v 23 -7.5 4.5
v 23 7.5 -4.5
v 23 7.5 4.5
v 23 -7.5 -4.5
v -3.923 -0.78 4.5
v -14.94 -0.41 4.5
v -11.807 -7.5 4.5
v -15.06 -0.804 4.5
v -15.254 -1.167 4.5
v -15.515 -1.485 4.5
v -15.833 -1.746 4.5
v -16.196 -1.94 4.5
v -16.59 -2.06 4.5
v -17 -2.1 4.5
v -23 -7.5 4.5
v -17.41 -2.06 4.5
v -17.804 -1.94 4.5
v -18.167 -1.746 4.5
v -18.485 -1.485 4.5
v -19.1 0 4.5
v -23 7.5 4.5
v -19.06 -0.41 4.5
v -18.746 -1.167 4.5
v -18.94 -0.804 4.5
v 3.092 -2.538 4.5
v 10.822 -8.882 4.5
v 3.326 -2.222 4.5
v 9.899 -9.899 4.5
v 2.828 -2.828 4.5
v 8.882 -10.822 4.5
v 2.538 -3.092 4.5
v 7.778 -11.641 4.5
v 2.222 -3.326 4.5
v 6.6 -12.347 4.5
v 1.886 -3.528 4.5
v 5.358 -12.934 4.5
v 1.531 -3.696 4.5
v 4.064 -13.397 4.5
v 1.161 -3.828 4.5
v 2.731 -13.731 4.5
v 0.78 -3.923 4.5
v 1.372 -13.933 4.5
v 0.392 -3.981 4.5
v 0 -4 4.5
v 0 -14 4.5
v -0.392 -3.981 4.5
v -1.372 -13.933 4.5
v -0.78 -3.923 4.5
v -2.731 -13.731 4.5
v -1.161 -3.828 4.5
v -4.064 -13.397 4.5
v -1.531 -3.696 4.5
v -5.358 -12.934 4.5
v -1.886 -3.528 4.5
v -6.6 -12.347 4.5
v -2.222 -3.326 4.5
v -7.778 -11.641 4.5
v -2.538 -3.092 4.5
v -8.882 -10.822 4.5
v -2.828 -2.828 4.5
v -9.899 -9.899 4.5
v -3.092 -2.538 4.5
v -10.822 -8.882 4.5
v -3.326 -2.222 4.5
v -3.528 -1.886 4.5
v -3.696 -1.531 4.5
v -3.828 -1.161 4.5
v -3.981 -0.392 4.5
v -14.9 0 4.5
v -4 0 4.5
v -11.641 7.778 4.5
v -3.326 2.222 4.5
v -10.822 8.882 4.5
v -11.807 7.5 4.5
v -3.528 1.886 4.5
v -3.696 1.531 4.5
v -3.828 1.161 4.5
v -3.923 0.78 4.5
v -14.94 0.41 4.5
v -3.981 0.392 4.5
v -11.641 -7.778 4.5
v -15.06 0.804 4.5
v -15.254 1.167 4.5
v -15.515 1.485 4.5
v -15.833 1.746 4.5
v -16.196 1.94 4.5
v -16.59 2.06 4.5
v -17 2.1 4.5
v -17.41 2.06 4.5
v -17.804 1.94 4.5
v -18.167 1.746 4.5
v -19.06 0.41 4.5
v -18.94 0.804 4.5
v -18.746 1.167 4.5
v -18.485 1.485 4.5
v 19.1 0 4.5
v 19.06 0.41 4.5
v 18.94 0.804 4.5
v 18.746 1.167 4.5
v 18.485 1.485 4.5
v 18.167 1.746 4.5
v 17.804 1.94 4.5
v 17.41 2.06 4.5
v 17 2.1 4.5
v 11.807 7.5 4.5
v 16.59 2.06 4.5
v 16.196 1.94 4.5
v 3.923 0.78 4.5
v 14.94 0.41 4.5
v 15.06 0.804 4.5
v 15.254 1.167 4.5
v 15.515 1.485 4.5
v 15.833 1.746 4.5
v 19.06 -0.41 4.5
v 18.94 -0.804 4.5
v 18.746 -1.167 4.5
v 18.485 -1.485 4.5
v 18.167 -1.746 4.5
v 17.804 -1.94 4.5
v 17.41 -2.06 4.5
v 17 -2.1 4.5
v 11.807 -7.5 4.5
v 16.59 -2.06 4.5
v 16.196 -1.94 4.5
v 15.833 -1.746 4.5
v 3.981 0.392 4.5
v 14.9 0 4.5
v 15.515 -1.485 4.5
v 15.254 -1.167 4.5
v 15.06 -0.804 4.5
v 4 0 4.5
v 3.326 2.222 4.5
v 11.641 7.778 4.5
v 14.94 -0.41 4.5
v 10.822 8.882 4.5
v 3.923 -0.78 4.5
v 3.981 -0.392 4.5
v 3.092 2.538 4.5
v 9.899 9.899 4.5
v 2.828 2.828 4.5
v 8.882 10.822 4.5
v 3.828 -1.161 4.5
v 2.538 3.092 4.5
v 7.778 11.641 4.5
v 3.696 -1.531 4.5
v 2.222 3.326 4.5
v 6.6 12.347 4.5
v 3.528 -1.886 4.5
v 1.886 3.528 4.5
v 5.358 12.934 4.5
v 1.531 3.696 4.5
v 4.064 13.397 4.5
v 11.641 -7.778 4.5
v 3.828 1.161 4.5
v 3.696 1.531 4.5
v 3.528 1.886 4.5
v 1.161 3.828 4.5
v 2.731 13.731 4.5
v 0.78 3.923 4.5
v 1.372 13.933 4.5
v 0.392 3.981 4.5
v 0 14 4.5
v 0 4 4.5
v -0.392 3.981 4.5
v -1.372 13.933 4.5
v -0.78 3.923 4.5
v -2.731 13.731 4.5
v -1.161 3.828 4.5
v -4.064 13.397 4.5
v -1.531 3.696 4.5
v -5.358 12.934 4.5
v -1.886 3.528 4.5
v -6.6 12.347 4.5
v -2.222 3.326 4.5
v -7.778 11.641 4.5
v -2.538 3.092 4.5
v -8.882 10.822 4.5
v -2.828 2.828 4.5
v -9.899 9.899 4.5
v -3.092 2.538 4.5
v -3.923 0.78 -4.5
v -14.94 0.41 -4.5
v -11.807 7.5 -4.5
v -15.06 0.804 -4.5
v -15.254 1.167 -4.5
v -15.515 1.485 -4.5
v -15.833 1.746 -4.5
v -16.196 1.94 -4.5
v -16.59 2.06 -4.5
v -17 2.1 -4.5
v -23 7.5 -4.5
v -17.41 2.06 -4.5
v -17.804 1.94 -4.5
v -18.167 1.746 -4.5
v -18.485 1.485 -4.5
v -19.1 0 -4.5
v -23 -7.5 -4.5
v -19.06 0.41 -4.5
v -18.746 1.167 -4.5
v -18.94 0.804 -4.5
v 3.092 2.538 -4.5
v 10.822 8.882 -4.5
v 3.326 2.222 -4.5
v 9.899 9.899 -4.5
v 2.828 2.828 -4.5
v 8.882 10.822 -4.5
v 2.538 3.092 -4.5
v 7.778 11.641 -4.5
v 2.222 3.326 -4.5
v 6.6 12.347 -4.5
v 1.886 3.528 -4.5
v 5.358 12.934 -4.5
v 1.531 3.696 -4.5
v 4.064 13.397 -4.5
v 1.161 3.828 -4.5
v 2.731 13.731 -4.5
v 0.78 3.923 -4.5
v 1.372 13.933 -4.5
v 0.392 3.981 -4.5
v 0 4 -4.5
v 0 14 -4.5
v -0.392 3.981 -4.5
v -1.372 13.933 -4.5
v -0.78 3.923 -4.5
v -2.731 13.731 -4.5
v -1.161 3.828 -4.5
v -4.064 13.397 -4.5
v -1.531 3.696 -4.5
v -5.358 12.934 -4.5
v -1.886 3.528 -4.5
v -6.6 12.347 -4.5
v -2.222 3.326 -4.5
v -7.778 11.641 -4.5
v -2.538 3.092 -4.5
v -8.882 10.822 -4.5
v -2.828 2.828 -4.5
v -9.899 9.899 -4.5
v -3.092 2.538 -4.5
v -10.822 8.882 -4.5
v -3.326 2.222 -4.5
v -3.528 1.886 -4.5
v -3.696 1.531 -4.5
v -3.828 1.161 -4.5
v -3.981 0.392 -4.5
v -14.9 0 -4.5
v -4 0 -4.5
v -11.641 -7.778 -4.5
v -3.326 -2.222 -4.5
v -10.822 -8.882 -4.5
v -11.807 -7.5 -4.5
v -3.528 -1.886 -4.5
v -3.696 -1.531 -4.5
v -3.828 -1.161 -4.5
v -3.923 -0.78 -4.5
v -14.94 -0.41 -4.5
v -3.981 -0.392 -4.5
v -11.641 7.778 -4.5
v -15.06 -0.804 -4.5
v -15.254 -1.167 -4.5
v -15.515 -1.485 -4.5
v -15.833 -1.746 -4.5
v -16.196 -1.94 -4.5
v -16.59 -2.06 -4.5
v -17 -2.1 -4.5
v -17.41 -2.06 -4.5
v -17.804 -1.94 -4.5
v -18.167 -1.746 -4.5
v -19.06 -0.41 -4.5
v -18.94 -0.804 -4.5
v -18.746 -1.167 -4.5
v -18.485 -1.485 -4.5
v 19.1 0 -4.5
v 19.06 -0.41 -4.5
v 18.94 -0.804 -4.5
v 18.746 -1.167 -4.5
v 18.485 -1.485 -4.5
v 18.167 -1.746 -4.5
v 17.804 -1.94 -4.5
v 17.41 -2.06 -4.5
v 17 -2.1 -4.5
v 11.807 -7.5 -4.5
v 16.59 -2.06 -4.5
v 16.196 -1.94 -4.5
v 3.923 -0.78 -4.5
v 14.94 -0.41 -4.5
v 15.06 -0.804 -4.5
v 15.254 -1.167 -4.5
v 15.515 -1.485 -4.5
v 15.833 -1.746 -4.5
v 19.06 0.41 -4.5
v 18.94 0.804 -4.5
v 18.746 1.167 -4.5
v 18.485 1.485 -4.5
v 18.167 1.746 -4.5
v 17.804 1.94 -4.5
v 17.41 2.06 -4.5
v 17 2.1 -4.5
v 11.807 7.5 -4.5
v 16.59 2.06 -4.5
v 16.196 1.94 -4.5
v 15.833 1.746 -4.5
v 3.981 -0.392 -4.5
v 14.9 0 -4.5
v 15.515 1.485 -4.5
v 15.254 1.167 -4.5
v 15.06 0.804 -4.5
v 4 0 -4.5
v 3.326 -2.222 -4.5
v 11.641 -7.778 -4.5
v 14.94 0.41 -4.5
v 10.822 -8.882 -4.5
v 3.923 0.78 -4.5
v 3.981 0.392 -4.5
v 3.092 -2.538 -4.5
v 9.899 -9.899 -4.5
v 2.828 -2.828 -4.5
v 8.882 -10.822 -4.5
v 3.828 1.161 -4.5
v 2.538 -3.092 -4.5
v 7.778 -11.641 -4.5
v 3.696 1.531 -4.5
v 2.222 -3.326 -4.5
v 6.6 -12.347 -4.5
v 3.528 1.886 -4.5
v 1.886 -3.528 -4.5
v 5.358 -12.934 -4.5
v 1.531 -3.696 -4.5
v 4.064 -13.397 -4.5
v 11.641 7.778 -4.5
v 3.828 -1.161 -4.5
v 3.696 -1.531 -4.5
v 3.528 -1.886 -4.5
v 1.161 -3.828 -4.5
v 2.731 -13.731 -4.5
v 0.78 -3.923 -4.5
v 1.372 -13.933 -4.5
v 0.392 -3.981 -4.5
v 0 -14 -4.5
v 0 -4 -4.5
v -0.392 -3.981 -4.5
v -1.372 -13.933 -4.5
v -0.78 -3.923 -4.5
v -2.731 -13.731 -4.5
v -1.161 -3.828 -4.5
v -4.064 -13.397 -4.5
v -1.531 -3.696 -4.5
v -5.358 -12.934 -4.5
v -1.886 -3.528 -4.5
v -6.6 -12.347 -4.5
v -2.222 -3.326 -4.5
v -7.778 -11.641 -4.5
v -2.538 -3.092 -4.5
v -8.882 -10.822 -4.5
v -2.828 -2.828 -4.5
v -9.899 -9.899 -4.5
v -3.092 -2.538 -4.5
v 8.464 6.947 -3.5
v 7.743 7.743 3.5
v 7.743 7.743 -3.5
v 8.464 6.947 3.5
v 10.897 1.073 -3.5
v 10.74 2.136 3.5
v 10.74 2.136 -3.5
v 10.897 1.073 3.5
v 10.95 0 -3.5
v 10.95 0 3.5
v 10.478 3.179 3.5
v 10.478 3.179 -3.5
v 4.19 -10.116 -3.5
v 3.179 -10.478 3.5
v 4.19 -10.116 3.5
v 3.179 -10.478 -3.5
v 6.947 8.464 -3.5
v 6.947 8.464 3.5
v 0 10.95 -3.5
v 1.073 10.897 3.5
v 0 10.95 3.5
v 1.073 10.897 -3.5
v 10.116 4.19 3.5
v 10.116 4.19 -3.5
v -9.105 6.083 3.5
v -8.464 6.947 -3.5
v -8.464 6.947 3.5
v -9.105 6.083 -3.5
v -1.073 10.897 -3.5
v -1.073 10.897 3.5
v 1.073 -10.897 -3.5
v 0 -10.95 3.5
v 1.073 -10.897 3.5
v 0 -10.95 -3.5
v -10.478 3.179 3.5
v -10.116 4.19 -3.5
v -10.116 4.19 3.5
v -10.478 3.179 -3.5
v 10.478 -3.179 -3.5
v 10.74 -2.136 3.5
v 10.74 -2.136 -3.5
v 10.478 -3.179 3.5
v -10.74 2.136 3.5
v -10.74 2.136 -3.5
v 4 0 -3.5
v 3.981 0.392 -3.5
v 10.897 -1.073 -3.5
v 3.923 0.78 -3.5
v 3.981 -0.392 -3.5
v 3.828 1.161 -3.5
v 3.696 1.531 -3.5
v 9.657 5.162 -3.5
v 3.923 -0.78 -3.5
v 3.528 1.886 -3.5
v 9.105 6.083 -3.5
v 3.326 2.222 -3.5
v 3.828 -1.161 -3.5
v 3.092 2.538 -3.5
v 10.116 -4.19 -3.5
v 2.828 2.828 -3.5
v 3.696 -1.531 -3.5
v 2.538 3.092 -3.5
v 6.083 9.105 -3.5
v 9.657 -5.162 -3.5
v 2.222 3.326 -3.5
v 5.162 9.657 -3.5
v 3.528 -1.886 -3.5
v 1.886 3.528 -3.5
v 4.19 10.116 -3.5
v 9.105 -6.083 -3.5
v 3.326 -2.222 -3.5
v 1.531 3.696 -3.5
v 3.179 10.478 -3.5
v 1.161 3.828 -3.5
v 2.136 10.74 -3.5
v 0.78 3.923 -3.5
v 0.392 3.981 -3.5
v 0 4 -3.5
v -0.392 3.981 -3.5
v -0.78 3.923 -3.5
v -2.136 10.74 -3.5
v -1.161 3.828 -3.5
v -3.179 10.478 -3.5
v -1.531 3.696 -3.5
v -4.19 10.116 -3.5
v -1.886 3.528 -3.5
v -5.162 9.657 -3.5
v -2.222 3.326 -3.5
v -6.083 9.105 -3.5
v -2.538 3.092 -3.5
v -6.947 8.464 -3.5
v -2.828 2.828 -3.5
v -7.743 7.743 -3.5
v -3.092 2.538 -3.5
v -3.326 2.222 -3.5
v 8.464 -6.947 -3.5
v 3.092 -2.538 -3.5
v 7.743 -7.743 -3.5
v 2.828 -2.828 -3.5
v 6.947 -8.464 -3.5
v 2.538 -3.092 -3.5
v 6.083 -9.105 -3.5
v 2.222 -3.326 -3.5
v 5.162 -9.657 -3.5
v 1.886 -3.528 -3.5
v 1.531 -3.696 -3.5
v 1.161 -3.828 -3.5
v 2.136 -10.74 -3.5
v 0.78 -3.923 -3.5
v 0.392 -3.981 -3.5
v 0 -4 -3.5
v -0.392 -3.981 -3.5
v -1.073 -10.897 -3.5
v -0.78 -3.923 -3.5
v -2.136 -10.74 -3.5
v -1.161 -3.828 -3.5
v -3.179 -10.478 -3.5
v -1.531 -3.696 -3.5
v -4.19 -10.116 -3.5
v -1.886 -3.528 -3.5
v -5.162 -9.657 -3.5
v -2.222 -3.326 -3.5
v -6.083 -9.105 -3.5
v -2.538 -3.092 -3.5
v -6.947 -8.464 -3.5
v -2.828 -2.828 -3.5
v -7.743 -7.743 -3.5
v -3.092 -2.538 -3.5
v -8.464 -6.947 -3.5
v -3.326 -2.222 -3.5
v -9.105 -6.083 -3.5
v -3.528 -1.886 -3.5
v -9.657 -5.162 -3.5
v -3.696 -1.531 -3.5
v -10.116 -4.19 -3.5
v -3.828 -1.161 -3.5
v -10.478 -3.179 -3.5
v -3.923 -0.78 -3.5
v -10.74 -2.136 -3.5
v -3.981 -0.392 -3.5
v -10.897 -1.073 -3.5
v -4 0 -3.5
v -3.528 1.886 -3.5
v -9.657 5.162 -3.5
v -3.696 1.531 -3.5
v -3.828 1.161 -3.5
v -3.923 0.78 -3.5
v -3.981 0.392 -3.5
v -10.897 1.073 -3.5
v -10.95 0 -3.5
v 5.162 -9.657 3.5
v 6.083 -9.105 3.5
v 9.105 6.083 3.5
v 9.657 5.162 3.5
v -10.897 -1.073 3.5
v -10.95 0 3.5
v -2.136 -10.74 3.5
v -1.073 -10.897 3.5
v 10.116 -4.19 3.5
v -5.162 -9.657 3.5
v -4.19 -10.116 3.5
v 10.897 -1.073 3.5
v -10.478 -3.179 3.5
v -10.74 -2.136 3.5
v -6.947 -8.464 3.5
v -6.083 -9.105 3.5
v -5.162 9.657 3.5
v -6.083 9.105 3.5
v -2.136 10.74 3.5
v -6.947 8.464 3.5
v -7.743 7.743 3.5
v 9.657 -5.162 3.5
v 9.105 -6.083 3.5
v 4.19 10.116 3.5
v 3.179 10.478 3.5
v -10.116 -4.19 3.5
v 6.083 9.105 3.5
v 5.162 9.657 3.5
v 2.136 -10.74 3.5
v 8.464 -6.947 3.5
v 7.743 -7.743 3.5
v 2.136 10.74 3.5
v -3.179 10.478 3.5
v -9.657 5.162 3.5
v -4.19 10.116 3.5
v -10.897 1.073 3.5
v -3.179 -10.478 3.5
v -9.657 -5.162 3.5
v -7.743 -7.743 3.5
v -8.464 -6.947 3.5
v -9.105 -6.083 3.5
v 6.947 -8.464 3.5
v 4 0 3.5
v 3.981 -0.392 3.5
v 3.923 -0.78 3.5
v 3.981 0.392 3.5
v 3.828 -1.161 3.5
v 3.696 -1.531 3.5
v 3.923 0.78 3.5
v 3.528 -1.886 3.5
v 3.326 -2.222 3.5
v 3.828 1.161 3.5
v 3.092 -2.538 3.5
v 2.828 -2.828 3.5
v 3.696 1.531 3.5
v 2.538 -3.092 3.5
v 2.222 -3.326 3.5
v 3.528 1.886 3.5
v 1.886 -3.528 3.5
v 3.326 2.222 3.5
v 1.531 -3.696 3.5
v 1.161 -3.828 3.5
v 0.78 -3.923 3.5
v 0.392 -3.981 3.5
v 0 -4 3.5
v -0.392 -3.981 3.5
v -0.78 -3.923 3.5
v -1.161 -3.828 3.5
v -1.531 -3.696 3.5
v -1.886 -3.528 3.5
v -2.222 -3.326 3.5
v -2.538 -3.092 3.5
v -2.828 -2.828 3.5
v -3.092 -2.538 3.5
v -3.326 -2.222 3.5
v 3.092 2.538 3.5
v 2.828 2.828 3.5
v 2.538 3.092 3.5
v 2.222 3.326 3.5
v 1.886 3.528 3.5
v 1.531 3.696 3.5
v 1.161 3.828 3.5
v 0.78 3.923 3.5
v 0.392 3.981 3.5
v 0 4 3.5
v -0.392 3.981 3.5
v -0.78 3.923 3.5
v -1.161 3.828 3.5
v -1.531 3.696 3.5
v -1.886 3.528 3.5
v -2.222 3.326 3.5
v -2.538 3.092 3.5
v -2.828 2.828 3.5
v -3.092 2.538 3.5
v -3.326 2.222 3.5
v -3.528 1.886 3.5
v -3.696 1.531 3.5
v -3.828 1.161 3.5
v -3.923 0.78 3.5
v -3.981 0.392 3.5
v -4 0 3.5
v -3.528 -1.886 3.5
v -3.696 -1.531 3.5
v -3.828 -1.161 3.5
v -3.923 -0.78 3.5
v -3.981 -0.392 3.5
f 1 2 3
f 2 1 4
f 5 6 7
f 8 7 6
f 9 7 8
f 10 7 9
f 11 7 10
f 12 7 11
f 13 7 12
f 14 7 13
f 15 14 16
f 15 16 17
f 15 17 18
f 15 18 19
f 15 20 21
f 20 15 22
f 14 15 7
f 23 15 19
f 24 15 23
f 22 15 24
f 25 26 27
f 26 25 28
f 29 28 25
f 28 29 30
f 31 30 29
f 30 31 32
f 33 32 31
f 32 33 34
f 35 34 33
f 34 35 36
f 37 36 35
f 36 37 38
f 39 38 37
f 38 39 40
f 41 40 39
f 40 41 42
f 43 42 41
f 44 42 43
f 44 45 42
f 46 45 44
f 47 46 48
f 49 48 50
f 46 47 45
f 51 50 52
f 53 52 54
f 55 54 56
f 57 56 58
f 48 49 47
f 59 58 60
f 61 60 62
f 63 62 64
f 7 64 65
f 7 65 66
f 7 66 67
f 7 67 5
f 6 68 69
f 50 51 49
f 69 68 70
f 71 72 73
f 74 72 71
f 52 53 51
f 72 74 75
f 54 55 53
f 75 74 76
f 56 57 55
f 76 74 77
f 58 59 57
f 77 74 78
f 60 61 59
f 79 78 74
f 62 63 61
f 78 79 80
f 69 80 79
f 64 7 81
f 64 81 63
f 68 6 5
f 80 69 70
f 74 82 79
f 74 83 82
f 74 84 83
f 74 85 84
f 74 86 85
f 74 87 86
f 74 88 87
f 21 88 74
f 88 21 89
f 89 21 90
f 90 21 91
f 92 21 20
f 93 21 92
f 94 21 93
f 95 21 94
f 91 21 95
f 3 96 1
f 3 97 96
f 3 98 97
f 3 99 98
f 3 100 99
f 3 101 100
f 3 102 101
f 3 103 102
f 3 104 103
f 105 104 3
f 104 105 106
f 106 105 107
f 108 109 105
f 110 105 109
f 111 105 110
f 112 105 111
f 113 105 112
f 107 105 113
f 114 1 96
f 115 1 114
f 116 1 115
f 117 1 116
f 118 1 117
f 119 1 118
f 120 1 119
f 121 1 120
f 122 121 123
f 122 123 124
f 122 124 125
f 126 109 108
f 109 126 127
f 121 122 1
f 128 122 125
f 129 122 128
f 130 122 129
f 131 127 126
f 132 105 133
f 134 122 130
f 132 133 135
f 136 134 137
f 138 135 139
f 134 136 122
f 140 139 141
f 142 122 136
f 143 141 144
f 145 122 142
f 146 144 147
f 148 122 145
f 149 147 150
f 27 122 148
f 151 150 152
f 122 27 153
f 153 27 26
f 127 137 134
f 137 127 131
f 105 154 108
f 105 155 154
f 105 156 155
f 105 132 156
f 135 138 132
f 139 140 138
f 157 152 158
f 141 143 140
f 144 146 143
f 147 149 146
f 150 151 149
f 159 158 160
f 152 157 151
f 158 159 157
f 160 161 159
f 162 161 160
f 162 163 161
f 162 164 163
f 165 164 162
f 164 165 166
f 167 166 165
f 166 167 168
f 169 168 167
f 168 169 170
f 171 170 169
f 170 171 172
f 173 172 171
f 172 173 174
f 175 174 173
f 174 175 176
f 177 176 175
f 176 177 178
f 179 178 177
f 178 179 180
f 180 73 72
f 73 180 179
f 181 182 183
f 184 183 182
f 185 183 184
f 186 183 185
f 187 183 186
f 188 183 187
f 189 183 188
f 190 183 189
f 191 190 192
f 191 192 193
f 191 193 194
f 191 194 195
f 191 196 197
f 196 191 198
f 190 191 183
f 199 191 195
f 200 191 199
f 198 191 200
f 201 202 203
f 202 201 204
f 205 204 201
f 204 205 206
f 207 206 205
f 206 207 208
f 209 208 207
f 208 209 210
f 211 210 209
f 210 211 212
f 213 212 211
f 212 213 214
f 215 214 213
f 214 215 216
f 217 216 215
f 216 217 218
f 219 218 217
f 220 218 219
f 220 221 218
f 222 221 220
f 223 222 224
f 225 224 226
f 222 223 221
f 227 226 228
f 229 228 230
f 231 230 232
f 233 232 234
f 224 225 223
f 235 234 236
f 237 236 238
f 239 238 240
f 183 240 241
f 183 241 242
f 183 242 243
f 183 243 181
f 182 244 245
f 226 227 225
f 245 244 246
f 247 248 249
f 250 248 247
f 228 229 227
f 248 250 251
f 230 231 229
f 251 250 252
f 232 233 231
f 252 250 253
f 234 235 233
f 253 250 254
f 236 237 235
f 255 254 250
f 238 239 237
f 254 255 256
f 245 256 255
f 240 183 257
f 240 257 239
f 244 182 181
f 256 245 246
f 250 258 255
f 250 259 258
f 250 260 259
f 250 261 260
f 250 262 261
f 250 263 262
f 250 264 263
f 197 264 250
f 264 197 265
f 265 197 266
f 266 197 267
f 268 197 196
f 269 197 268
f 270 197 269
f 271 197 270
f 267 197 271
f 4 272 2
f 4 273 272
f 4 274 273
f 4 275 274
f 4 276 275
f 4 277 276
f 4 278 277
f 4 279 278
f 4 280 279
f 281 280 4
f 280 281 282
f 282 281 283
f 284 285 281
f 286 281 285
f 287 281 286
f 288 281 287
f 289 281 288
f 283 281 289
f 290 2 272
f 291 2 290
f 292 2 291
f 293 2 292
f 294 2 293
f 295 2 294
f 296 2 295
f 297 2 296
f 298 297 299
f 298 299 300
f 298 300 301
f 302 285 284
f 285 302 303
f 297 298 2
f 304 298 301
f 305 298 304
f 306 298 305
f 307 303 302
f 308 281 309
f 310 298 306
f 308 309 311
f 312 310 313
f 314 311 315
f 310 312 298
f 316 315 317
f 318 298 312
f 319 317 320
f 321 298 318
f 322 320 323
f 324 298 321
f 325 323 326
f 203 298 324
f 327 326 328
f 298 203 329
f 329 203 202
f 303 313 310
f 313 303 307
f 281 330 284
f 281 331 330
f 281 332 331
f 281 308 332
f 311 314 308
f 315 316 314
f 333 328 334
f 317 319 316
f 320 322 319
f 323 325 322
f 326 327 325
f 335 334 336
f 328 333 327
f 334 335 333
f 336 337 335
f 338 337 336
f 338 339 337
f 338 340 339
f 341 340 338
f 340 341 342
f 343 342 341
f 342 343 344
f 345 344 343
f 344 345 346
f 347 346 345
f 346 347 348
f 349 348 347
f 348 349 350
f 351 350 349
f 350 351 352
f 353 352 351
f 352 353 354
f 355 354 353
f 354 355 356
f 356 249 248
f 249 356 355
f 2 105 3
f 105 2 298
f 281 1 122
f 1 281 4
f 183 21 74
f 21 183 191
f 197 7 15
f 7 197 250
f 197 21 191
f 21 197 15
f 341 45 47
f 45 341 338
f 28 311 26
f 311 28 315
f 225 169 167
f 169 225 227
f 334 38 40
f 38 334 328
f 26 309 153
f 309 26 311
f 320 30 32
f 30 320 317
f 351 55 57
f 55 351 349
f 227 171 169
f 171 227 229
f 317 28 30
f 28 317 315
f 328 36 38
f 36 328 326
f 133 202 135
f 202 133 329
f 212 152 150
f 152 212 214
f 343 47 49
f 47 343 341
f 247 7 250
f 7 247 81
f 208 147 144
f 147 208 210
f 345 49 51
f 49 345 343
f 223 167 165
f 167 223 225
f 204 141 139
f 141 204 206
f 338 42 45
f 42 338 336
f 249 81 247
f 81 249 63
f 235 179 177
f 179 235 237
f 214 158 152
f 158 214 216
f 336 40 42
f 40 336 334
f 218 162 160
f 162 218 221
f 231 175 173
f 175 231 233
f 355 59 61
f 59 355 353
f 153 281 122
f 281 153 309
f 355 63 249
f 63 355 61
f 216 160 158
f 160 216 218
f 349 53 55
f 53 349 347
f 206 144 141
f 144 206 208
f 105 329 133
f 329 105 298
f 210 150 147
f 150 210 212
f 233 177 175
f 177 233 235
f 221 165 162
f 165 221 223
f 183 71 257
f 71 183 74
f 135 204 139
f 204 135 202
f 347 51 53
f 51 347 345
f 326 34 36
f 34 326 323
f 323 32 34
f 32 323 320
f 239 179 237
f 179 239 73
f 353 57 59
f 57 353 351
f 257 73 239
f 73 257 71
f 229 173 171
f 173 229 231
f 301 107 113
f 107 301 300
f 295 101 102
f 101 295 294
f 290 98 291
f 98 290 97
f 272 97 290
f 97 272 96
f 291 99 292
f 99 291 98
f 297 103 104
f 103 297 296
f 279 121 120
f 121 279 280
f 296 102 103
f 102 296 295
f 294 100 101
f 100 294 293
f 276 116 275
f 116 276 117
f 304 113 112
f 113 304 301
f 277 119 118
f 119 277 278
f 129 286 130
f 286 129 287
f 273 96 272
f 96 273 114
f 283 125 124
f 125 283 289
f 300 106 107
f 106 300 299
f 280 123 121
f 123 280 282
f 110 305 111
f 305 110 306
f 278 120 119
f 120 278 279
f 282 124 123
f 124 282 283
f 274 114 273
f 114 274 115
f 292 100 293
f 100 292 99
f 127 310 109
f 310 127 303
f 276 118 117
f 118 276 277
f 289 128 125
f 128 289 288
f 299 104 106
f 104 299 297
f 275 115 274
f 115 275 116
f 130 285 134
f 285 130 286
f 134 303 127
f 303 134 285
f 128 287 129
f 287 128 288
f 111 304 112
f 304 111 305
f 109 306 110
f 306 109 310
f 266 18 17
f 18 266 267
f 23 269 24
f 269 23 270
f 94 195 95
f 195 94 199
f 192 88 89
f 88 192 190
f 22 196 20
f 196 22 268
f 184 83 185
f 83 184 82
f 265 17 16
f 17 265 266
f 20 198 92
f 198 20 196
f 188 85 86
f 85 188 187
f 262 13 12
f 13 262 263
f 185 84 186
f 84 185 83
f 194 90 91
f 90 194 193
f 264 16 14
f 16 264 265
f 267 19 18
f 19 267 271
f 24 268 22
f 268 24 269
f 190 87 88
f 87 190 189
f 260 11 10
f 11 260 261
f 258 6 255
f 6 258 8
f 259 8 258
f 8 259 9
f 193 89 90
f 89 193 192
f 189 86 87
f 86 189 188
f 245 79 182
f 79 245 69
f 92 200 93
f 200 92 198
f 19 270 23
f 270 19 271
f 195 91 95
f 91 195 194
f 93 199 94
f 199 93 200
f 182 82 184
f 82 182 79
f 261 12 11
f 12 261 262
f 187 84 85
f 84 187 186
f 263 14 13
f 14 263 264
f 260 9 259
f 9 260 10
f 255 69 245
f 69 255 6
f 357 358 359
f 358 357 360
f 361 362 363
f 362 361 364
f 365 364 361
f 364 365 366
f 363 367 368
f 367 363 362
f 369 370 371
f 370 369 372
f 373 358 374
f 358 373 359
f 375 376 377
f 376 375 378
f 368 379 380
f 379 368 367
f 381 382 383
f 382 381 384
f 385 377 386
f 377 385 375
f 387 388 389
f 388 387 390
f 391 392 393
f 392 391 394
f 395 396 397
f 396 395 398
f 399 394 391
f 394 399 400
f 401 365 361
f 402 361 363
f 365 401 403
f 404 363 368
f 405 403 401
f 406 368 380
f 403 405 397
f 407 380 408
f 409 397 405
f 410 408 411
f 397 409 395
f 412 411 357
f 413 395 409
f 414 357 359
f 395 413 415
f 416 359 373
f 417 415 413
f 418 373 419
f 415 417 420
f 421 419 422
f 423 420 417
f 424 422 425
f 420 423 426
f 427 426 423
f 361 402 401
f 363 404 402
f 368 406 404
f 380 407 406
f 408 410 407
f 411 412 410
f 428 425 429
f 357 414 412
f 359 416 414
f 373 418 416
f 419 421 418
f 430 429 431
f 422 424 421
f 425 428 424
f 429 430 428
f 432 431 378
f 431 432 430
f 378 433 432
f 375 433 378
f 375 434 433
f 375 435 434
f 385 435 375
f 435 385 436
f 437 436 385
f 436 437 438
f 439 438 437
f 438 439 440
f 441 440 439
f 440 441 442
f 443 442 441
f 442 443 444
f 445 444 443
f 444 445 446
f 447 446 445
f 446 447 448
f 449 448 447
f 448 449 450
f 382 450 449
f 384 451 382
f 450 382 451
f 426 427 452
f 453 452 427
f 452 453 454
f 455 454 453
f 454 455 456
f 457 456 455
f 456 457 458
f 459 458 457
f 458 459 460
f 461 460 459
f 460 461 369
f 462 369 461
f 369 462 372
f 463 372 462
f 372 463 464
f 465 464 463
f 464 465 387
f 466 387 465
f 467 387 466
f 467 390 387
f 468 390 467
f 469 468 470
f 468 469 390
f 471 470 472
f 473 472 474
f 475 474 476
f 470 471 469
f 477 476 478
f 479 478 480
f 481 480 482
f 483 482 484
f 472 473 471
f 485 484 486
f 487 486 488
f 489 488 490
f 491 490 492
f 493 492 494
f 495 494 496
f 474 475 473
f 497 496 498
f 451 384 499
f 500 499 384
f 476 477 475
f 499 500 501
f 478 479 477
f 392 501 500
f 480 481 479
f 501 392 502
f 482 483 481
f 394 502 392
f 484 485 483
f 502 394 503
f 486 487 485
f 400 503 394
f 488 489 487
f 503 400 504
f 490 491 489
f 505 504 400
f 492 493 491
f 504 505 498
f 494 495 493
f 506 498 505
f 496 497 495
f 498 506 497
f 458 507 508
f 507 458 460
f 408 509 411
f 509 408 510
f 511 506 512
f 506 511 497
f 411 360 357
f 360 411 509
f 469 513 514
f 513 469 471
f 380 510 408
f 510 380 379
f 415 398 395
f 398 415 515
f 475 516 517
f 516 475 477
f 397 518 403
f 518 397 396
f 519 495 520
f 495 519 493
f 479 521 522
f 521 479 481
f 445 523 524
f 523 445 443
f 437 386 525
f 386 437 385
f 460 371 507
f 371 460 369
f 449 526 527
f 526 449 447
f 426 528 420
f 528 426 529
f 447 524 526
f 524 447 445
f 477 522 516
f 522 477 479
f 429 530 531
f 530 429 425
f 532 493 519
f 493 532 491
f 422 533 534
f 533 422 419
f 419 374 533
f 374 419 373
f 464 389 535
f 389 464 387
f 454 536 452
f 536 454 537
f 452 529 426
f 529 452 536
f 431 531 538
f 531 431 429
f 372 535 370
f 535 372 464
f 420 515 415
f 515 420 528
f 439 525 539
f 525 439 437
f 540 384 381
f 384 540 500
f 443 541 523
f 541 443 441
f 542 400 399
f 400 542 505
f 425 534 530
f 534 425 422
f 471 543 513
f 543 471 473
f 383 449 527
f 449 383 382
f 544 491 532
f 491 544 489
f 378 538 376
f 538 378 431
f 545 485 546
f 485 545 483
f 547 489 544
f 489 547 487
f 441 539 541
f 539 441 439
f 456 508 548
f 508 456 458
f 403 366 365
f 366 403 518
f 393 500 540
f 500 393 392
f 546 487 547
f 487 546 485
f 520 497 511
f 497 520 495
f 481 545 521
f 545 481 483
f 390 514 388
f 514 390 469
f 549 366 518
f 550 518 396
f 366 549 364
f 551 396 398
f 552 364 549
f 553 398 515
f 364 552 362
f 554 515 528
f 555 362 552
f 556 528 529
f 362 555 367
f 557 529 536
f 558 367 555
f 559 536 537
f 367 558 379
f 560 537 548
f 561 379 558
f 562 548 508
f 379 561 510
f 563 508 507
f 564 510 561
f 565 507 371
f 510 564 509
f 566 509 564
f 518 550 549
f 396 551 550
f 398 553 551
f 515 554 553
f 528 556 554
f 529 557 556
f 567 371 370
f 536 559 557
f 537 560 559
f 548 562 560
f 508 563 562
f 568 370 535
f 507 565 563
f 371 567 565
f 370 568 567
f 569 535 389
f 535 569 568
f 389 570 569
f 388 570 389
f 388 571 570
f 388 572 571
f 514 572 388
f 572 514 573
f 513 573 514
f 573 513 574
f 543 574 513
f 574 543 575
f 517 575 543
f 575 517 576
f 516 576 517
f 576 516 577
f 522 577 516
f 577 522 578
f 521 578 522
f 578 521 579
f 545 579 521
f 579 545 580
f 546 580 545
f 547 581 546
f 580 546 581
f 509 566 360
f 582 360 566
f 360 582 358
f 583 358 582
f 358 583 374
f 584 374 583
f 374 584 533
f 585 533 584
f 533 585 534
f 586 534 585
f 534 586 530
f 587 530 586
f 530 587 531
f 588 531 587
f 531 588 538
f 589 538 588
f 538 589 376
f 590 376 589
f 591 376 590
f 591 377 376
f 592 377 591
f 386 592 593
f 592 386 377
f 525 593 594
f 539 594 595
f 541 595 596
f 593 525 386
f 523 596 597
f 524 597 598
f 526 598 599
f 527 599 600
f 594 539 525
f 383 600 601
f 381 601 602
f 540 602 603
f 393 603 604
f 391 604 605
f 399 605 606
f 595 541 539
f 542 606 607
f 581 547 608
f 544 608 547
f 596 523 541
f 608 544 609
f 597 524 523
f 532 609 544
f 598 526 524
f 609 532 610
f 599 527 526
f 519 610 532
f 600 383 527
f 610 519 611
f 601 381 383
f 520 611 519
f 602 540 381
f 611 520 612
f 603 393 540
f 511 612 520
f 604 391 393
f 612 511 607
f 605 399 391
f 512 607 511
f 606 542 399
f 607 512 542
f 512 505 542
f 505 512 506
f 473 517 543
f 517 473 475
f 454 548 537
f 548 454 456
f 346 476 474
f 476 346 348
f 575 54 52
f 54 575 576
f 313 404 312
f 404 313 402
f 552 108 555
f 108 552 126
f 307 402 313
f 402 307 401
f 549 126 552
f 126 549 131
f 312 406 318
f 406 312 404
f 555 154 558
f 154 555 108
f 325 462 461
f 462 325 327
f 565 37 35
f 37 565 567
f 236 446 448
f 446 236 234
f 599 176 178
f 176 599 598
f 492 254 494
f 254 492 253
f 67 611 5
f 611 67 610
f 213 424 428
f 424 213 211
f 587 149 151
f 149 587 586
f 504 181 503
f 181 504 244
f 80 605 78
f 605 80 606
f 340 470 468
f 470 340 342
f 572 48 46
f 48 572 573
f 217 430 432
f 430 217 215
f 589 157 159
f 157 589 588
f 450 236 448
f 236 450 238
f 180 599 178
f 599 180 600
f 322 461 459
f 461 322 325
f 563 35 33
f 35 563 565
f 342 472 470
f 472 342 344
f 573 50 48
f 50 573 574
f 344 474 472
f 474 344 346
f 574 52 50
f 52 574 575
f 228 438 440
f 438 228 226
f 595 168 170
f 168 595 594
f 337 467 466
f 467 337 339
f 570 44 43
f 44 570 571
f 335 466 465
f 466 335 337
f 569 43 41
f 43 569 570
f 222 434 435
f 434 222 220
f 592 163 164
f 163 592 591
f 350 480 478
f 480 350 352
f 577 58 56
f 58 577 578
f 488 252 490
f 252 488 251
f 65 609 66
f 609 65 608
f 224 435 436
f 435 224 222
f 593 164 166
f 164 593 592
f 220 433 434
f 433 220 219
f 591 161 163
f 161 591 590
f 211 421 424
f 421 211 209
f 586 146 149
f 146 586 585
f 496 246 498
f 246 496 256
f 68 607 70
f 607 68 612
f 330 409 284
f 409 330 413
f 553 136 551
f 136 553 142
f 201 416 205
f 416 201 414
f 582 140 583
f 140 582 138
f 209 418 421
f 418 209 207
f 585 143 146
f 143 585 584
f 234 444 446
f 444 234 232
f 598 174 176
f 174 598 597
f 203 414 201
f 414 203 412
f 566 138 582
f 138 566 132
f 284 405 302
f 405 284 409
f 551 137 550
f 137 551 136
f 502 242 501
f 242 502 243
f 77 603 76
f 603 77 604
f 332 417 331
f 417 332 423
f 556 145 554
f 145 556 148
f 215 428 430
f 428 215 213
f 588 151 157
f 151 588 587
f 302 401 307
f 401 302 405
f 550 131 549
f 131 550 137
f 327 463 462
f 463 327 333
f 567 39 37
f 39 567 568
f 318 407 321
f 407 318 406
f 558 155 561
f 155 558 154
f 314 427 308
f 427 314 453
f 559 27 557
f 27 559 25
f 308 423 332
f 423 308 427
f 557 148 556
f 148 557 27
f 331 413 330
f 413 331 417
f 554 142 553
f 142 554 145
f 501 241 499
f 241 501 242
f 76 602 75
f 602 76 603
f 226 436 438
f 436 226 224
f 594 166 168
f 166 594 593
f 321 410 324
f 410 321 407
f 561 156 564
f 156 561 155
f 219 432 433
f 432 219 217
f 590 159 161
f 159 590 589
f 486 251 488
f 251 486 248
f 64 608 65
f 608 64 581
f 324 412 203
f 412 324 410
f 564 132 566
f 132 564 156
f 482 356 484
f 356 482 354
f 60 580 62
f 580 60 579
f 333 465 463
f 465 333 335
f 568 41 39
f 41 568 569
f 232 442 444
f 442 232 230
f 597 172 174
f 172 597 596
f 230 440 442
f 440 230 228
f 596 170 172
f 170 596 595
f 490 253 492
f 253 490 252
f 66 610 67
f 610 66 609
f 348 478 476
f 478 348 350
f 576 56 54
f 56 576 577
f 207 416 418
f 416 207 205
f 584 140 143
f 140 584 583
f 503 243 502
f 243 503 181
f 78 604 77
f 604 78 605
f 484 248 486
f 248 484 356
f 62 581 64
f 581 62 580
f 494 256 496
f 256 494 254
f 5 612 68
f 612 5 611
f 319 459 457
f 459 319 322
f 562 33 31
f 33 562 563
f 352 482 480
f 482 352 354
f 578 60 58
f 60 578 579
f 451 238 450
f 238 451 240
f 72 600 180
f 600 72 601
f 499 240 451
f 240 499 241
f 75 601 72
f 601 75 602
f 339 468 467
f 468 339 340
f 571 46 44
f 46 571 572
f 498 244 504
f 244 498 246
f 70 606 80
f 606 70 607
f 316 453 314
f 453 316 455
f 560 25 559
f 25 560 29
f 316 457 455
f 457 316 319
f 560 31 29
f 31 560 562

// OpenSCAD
// 608 Bearing Housing with Flanges
// 608ZZ: OD=22mm, ID=8mm, H=7mm
bearing_od = 22;
bearing_id = 8;
bearing_h = 7;
wall = 3;
flange_width = 12;

difference() {
    union() {
        // Main housing
        cylinder(d=bearing_od + wall*2, h=bearing_h + 2, center=true, $fn=64);

        // Mounting flanges
        for (a = [0, 180]) {
            rotate([0, 0, a])
                translate([bearing_od/2 + flange_width/2, 0, 0])
                    cube([flange_width, 15, bearing_h + 2], center=true);
        }
    }

    // Bearing pocket (press fit)
    cylinder(d=bearing_od - 0.1, h=bearing_h, center=true, $fn=64);

    // Through hole
    cylinder(d=bearing_id, h=bearing_h + 10, center=true, $fn=64);

    // Flange mounting holes
    for (a = [0, 180]) {
        rotate([0, 0, a])
            translate([bearing_od/2 + flange_width/2, 0, 0])
                cylinder(d=4.2, h=bearing_h + 10, center=true, $fn=32);
    }
}
